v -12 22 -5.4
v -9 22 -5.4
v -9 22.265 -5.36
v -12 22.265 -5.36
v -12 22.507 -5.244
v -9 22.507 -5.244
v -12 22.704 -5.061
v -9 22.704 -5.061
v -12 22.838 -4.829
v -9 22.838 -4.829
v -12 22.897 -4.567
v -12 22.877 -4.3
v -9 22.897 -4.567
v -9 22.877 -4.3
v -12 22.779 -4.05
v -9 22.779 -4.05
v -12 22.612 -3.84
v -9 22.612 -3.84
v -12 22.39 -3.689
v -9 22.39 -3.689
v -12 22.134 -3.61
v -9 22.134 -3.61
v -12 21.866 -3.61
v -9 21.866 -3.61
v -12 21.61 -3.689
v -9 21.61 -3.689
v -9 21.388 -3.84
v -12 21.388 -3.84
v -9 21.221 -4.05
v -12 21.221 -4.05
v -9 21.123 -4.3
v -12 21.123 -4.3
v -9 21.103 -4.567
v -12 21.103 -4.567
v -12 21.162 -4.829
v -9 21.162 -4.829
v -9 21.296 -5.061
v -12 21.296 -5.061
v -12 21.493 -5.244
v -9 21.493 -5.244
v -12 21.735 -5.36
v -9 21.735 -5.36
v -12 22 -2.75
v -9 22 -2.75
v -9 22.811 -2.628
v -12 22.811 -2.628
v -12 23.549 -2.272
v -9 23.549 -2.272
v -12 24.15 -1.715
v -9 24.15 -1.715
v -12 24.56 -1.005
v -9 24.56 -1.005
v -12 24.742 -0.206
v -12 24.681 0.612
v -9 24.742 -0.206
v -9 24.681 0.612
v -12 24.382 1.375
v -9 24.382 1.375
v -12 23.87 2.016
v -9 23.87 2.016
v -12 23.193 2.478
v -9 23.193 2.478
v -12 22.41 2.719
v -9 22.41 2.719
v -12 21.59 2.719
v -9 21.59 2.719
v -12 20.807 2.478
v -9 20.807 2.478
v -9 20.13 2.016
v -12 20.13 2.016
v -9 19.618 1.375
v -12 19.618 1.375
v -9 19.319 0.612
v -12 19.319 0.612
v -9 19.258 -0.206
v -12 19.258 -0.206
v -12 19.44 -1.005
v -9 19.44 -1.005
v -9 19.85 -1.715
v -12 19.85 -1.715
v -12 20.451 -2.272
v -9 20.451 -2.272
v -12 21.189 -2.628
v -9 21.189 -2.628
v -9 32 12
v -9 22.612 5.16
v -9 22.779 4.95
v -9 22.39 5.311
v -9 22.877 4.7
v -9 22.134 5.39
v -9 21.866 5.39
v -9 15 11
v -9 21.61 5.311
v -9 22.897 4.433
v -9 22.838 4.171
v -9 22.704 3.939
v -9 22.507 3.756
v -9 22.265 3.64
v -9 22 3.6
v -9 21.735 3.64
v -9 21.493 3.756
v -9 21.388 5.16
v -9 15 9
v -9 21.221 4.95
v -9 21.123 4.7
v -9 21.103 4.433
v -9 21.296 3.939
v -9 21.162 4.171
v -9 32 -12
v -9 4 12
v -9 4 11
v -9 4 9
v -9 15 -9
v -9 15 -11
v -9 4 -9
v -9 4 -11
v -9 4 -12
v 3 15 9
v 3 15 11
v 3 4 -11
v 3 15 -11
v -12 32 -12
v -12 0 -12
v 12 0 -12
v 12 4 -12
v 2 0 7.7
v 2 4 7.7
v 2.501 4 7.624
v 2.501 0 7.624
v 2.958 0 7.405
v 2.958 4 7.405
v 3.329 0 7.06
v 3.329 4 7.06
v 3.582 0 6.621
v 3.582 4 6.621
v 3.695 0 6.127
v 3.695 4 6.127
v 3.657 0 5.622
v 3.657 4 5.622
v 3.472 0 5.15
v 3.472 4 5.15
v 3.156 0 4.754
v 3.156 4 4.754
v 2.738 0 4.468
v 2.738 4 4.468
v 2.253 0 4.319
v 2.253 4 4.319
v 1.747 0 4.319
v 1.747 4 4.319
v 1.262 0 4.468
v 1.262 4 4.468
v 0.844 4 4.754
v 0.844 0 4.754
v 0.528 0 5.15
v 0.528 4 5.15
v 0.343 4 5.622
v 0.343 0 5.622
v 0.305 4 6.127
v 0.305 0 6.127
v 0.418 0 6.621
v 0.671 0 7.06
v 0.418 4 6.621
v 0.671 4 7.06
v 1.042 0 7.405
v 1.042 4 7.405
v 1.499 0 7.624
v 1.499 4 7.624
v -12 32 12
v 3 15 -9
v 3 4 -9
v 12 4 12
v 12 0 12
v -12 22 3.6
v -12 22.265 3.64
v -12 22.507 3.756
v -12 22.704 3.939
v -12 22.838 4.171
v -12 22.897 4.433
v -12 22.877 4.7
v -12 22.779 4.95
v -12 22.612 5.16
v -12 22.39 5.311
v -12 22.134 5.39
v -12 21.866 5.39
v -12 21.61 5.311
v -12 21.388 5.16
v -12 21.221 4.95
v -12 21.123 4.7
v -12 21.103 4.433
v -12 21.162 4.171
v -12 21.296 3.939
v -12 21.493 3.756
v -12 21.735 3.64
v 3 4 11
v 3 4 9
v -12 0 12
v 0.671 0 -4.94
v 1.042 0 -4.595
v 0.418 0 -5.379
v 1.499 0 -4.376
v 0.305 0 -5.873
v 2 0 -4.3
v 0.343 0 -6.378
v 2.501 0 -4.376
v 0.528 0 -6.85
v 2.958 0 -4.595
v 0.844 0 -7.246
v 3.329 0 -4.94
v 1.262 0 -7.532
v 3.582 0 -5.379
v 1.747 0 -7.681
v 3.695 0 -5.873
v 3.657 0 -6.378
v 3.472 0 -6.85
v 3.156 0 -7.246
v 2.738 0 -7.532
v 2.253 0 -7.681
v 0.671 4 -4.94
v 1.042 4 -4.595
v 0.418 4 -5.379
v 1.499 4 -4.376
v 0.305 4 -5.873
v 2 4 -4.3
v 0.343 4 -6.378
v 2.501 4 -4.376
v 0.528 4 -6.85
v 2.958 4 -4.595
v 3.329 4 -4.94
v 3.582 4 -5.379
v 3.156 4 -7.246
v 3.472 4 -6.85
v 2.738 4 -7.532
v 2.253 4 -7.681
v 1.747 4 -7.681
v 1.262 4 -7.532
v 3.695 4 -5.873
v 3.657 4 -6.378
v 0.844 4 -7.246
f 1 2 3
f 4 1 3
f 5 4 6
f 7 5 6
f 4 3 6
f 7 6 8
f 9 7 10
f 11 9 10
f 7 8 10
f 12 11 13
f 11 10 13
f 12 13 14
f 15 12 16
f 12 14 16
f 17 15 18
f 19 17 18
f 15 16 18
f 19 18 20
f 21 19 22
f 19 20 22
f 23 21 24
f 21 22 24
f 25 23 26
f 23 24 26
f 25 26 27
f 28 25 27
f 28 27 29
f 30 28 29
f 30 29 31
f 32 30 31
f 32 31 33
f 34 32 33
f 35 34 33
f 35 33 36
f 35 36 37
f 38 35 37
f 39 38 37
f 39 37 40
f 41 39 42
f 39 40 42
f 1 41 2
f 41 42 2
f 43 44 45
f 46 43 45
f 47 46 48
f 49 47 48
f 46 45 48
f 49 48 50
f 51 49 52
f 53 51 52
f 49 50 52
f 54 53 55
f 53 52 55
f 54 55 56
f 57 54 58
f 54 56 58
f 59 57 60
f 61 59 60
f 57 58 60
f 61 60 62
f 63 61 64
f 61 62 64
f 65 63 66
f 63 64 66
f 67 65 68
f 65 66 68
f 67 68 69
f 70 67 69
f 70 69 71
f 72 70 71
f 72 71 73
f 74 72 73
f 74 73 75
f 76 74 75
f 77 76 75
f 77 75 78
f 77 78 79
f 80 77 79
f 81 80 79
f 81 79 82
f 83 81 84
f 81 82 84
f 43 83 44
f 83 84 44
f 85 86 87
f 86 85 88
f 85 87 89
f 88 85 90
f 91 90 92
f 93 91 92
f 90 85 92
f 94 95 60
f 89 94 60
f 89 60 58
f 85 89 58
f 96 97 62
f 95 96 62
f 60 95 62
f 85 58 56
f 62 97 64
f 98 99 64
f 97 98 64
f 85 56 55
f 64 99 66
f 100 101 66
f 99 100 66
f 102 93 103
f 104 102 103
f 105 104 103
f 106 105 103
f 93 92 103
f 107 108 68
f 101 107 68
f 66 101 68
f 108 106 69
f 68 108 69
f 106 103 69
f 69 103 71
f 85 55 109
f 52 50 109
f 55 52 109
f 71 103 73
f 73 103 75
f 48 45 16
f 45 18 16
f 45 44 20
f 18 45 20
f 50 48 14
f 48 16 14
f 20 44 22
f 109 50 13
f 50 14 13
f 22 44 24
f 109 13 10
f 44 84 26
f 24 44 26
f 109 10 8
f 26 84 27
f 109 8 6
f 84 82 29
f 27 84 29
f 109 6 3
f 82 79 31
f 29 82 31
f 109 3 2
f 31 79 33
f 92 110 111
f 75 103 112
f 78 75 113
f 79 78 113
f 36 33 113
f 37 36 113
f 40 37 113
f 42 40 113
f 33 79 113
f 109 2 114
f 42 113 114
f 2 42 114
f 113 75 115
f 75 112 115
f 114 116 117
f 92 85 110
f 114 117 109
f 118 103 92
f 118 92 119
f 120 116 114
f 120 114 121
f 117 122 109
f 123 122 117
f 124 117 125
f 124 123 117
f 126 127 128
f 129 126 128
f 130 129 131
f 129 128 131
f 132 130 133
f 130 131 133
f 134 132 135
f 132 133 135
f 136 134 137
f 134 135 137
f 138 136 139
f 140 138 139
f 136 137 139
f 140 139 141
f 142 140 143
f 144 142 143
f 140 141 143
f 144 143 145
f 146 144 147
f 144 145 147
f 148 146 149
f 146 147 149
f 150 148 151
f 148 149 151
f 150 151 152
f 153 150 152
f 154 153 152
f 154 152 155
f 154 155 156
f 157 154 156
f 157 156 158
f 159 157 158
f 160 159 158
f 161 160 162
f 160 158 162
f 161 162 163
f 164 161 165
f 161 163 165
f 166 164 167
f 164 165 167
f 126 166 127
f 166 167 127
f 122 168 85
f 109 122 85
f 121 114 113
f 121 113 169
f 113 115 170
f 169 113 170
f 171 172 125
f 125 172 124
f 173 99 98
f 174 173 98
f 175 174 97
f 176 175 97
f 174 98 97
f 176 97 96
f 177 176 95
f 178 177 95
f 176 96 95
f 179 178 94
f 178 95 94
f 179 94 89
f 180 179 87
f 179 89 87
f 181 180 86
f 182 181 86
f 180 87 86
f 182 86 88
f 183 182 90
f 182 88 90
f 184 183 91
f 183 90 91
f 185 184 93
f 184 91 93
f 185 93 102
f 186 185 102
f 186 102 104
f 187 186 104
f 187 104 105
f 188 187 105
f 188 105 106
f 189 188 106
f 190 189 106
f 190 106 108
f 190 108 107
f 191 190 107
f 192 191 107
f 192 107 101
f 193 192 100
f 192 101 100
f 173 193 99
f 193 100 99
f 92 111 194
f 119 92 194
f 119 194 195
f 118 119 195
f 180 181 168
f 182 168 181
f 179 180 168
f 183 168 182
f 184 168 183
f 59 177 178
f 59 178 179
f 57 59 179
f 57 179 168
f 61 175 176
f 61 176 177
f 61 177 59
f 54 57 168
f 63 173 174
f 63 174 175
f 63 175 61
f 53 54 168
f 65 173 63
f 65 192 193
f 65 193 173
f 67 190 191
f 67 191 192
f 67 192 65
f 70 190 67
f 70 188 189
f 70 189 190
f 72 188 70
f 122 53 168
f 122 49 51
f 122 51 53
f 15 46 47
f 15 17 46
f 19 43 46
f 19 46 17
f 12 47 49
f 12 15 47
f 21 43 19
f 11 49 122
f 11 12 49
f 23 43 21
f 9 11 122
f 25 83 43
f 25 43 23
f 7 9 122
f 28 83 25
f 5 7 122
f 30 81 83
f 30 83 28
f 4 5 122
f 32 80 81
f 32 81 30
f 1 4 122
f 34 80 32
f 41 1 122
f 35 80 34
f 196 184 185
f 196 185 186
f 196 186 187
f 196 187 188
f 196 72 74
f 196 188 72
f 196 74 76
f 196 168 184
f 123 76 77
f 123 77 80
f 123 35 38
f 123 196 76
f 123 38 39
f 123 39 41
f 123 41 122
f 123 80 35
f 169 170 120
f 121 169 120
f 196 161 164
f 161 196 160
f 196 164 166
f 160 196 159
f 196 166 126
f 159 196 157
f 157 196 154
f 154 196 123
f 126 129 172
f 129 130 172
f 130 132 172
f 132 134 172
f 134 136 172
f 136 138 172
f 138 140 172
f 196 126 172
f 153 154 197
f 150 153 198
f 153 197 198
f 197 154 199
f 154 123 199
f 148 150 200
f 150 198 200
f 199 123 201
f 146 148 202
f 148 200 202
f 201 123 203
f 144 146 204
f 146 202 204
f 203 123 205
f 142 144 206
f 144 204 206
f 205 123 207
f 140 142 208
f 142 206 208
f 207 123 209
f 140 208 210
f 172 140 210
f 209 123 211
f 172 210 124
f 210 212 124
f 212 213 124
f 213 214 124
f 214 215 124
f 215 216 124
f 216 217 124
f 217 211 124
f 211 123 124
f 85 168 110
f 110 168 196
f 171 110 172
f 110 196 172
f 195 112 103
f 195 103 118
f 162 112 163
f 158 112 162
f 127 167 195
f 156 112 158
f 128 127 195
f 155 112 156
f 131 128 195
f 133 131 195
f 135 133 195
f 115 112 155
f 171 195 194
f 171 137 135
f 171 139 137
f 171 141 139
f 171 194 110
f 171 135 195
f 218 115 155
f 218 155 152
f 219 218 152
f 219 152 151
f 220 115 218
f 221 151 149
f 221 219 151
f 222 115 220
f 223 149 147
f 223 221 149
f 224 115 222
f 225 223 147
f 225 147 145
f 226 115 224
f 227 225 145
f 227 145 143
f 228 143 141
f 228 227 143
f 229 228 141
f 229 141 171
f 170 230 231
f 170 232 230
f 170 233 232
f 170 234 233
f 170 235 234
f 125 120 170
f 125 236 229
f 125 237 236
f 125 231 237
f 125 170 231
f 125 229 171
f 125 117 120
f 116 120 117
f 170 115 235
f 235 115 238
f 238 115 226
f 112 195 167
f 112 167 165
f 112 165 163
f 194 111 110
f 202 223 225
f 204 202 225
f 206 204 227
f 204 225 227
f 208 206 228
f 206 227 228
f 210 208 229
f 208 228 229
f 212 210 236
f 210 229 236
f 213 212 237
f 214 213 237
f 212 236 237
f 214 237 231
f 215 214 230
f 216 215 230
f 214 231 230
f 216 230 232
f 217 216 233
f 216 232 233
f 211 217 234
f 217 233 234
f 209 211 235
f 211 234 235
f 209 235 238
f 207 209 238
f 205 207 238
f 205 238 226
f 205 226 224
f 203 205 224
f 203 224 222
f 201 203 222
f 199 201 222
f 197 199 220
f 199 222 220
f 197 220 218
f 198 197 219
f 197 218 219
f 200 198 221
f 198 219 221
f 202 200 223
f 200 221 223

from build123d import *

# Parameters (mm, degrees)
SKETCH1_W           = 24
SKETCH1_H           = 24
BOSS_EXTRUDE1_DEPTH = 4
SKETCH2_W           = 3
SKETCH2_H           = 24
BOSS_EXTRUDE2_DEPTH = 28
SKETCH3_R           = 2.75
SKETCH3_R_2         = 0.9
CUT_EXTRUDE1_DEPTH  = 3
SKETCH4_R           = 1.7
CUT_EXTRUDE2_DEPTH  = 4
SKETCH6_W           = 12
SKETCH6_H           = 2
BOSS_EXTRUDE3_DEPTH = 11


with BuildPart() as part:
    # Sketch1 → Boss-Extrude1 (new body)
    with BuildSketch(Plane(origin=(0, 0, 0), x_dir=(1, 0, 0), z_dir=(0, 1, 0))):
        Rectangle(SKETCH1_W, SKETCH1_H)
    extrude(amount=BOSS_EXTRUDE1_DEPTH)

    # Sketch2 → Boss-Extrude2 (add)
    with BuildSketch(Plane(origin=(0, 4, 0), x_dir=(1, 0, 0), z_dir=(0, 1, 0))):
        with Locations((-10.5, 0)):
            Rectangle(SKETCH2_W, SKETCH2_H)
    extrude(amount=BOSS_EXTRUDE2_DEPTH)

    # Sketch3 → Cut-Extrude1 (cut)
    with BuildSketch(Plane(origin=(-9, 0, 0), x_dir=(0, 0, -1), z_dir=(1, 0, 0))):
        with Locations((0, 22)):
            Circle(SKETCH3_R)
        with Locations((4.5, 22)):
            Circle(SKETCH3_R_2)
        with Locations((-4.5, 22)):
            Circle(SKETCH3_R_2)
    extrude(amount=-CUT_EXTRUDE1_DEPTH, mode=Mode.SUBTRACT)

    # Sketch4 → Cut-Extrude2 (cut)
    with BuildSketch(Plane(origin=(0, 4, 0), x_dir=(1, 0, 0), z_dir=(0, 1, 0))):
        with Locations(Location((2, 6, 0), (0, 0, 270))):
            Circle(SKETCH4_R)
        with Locations(Location((2, -6, 0), (0, 0, 270))):
            Circle(SKETCH4_R)
    extrude(amount=-CUT_EXTRUDE2_DEPTH, mode=Mode.SUBTRACT)

    # Sketch6 → Boss-Extrude3 (add)
    with BuildSketch(Plane(origin=(0, 4, 0), x_dir=(1, 0, 0), z_dir=(0, 1, 0))):
        with Locations((-3, -10)):
            Rectangle(SKETCH6_W, SKETCH6_H)
        with Locations((-3, 10)):
            Rectangle(SKETCH6_W, SKETCH6_H)
    extrude(amount=BOSS_EXTRUDE3_DEPTH)


solid = part.part
